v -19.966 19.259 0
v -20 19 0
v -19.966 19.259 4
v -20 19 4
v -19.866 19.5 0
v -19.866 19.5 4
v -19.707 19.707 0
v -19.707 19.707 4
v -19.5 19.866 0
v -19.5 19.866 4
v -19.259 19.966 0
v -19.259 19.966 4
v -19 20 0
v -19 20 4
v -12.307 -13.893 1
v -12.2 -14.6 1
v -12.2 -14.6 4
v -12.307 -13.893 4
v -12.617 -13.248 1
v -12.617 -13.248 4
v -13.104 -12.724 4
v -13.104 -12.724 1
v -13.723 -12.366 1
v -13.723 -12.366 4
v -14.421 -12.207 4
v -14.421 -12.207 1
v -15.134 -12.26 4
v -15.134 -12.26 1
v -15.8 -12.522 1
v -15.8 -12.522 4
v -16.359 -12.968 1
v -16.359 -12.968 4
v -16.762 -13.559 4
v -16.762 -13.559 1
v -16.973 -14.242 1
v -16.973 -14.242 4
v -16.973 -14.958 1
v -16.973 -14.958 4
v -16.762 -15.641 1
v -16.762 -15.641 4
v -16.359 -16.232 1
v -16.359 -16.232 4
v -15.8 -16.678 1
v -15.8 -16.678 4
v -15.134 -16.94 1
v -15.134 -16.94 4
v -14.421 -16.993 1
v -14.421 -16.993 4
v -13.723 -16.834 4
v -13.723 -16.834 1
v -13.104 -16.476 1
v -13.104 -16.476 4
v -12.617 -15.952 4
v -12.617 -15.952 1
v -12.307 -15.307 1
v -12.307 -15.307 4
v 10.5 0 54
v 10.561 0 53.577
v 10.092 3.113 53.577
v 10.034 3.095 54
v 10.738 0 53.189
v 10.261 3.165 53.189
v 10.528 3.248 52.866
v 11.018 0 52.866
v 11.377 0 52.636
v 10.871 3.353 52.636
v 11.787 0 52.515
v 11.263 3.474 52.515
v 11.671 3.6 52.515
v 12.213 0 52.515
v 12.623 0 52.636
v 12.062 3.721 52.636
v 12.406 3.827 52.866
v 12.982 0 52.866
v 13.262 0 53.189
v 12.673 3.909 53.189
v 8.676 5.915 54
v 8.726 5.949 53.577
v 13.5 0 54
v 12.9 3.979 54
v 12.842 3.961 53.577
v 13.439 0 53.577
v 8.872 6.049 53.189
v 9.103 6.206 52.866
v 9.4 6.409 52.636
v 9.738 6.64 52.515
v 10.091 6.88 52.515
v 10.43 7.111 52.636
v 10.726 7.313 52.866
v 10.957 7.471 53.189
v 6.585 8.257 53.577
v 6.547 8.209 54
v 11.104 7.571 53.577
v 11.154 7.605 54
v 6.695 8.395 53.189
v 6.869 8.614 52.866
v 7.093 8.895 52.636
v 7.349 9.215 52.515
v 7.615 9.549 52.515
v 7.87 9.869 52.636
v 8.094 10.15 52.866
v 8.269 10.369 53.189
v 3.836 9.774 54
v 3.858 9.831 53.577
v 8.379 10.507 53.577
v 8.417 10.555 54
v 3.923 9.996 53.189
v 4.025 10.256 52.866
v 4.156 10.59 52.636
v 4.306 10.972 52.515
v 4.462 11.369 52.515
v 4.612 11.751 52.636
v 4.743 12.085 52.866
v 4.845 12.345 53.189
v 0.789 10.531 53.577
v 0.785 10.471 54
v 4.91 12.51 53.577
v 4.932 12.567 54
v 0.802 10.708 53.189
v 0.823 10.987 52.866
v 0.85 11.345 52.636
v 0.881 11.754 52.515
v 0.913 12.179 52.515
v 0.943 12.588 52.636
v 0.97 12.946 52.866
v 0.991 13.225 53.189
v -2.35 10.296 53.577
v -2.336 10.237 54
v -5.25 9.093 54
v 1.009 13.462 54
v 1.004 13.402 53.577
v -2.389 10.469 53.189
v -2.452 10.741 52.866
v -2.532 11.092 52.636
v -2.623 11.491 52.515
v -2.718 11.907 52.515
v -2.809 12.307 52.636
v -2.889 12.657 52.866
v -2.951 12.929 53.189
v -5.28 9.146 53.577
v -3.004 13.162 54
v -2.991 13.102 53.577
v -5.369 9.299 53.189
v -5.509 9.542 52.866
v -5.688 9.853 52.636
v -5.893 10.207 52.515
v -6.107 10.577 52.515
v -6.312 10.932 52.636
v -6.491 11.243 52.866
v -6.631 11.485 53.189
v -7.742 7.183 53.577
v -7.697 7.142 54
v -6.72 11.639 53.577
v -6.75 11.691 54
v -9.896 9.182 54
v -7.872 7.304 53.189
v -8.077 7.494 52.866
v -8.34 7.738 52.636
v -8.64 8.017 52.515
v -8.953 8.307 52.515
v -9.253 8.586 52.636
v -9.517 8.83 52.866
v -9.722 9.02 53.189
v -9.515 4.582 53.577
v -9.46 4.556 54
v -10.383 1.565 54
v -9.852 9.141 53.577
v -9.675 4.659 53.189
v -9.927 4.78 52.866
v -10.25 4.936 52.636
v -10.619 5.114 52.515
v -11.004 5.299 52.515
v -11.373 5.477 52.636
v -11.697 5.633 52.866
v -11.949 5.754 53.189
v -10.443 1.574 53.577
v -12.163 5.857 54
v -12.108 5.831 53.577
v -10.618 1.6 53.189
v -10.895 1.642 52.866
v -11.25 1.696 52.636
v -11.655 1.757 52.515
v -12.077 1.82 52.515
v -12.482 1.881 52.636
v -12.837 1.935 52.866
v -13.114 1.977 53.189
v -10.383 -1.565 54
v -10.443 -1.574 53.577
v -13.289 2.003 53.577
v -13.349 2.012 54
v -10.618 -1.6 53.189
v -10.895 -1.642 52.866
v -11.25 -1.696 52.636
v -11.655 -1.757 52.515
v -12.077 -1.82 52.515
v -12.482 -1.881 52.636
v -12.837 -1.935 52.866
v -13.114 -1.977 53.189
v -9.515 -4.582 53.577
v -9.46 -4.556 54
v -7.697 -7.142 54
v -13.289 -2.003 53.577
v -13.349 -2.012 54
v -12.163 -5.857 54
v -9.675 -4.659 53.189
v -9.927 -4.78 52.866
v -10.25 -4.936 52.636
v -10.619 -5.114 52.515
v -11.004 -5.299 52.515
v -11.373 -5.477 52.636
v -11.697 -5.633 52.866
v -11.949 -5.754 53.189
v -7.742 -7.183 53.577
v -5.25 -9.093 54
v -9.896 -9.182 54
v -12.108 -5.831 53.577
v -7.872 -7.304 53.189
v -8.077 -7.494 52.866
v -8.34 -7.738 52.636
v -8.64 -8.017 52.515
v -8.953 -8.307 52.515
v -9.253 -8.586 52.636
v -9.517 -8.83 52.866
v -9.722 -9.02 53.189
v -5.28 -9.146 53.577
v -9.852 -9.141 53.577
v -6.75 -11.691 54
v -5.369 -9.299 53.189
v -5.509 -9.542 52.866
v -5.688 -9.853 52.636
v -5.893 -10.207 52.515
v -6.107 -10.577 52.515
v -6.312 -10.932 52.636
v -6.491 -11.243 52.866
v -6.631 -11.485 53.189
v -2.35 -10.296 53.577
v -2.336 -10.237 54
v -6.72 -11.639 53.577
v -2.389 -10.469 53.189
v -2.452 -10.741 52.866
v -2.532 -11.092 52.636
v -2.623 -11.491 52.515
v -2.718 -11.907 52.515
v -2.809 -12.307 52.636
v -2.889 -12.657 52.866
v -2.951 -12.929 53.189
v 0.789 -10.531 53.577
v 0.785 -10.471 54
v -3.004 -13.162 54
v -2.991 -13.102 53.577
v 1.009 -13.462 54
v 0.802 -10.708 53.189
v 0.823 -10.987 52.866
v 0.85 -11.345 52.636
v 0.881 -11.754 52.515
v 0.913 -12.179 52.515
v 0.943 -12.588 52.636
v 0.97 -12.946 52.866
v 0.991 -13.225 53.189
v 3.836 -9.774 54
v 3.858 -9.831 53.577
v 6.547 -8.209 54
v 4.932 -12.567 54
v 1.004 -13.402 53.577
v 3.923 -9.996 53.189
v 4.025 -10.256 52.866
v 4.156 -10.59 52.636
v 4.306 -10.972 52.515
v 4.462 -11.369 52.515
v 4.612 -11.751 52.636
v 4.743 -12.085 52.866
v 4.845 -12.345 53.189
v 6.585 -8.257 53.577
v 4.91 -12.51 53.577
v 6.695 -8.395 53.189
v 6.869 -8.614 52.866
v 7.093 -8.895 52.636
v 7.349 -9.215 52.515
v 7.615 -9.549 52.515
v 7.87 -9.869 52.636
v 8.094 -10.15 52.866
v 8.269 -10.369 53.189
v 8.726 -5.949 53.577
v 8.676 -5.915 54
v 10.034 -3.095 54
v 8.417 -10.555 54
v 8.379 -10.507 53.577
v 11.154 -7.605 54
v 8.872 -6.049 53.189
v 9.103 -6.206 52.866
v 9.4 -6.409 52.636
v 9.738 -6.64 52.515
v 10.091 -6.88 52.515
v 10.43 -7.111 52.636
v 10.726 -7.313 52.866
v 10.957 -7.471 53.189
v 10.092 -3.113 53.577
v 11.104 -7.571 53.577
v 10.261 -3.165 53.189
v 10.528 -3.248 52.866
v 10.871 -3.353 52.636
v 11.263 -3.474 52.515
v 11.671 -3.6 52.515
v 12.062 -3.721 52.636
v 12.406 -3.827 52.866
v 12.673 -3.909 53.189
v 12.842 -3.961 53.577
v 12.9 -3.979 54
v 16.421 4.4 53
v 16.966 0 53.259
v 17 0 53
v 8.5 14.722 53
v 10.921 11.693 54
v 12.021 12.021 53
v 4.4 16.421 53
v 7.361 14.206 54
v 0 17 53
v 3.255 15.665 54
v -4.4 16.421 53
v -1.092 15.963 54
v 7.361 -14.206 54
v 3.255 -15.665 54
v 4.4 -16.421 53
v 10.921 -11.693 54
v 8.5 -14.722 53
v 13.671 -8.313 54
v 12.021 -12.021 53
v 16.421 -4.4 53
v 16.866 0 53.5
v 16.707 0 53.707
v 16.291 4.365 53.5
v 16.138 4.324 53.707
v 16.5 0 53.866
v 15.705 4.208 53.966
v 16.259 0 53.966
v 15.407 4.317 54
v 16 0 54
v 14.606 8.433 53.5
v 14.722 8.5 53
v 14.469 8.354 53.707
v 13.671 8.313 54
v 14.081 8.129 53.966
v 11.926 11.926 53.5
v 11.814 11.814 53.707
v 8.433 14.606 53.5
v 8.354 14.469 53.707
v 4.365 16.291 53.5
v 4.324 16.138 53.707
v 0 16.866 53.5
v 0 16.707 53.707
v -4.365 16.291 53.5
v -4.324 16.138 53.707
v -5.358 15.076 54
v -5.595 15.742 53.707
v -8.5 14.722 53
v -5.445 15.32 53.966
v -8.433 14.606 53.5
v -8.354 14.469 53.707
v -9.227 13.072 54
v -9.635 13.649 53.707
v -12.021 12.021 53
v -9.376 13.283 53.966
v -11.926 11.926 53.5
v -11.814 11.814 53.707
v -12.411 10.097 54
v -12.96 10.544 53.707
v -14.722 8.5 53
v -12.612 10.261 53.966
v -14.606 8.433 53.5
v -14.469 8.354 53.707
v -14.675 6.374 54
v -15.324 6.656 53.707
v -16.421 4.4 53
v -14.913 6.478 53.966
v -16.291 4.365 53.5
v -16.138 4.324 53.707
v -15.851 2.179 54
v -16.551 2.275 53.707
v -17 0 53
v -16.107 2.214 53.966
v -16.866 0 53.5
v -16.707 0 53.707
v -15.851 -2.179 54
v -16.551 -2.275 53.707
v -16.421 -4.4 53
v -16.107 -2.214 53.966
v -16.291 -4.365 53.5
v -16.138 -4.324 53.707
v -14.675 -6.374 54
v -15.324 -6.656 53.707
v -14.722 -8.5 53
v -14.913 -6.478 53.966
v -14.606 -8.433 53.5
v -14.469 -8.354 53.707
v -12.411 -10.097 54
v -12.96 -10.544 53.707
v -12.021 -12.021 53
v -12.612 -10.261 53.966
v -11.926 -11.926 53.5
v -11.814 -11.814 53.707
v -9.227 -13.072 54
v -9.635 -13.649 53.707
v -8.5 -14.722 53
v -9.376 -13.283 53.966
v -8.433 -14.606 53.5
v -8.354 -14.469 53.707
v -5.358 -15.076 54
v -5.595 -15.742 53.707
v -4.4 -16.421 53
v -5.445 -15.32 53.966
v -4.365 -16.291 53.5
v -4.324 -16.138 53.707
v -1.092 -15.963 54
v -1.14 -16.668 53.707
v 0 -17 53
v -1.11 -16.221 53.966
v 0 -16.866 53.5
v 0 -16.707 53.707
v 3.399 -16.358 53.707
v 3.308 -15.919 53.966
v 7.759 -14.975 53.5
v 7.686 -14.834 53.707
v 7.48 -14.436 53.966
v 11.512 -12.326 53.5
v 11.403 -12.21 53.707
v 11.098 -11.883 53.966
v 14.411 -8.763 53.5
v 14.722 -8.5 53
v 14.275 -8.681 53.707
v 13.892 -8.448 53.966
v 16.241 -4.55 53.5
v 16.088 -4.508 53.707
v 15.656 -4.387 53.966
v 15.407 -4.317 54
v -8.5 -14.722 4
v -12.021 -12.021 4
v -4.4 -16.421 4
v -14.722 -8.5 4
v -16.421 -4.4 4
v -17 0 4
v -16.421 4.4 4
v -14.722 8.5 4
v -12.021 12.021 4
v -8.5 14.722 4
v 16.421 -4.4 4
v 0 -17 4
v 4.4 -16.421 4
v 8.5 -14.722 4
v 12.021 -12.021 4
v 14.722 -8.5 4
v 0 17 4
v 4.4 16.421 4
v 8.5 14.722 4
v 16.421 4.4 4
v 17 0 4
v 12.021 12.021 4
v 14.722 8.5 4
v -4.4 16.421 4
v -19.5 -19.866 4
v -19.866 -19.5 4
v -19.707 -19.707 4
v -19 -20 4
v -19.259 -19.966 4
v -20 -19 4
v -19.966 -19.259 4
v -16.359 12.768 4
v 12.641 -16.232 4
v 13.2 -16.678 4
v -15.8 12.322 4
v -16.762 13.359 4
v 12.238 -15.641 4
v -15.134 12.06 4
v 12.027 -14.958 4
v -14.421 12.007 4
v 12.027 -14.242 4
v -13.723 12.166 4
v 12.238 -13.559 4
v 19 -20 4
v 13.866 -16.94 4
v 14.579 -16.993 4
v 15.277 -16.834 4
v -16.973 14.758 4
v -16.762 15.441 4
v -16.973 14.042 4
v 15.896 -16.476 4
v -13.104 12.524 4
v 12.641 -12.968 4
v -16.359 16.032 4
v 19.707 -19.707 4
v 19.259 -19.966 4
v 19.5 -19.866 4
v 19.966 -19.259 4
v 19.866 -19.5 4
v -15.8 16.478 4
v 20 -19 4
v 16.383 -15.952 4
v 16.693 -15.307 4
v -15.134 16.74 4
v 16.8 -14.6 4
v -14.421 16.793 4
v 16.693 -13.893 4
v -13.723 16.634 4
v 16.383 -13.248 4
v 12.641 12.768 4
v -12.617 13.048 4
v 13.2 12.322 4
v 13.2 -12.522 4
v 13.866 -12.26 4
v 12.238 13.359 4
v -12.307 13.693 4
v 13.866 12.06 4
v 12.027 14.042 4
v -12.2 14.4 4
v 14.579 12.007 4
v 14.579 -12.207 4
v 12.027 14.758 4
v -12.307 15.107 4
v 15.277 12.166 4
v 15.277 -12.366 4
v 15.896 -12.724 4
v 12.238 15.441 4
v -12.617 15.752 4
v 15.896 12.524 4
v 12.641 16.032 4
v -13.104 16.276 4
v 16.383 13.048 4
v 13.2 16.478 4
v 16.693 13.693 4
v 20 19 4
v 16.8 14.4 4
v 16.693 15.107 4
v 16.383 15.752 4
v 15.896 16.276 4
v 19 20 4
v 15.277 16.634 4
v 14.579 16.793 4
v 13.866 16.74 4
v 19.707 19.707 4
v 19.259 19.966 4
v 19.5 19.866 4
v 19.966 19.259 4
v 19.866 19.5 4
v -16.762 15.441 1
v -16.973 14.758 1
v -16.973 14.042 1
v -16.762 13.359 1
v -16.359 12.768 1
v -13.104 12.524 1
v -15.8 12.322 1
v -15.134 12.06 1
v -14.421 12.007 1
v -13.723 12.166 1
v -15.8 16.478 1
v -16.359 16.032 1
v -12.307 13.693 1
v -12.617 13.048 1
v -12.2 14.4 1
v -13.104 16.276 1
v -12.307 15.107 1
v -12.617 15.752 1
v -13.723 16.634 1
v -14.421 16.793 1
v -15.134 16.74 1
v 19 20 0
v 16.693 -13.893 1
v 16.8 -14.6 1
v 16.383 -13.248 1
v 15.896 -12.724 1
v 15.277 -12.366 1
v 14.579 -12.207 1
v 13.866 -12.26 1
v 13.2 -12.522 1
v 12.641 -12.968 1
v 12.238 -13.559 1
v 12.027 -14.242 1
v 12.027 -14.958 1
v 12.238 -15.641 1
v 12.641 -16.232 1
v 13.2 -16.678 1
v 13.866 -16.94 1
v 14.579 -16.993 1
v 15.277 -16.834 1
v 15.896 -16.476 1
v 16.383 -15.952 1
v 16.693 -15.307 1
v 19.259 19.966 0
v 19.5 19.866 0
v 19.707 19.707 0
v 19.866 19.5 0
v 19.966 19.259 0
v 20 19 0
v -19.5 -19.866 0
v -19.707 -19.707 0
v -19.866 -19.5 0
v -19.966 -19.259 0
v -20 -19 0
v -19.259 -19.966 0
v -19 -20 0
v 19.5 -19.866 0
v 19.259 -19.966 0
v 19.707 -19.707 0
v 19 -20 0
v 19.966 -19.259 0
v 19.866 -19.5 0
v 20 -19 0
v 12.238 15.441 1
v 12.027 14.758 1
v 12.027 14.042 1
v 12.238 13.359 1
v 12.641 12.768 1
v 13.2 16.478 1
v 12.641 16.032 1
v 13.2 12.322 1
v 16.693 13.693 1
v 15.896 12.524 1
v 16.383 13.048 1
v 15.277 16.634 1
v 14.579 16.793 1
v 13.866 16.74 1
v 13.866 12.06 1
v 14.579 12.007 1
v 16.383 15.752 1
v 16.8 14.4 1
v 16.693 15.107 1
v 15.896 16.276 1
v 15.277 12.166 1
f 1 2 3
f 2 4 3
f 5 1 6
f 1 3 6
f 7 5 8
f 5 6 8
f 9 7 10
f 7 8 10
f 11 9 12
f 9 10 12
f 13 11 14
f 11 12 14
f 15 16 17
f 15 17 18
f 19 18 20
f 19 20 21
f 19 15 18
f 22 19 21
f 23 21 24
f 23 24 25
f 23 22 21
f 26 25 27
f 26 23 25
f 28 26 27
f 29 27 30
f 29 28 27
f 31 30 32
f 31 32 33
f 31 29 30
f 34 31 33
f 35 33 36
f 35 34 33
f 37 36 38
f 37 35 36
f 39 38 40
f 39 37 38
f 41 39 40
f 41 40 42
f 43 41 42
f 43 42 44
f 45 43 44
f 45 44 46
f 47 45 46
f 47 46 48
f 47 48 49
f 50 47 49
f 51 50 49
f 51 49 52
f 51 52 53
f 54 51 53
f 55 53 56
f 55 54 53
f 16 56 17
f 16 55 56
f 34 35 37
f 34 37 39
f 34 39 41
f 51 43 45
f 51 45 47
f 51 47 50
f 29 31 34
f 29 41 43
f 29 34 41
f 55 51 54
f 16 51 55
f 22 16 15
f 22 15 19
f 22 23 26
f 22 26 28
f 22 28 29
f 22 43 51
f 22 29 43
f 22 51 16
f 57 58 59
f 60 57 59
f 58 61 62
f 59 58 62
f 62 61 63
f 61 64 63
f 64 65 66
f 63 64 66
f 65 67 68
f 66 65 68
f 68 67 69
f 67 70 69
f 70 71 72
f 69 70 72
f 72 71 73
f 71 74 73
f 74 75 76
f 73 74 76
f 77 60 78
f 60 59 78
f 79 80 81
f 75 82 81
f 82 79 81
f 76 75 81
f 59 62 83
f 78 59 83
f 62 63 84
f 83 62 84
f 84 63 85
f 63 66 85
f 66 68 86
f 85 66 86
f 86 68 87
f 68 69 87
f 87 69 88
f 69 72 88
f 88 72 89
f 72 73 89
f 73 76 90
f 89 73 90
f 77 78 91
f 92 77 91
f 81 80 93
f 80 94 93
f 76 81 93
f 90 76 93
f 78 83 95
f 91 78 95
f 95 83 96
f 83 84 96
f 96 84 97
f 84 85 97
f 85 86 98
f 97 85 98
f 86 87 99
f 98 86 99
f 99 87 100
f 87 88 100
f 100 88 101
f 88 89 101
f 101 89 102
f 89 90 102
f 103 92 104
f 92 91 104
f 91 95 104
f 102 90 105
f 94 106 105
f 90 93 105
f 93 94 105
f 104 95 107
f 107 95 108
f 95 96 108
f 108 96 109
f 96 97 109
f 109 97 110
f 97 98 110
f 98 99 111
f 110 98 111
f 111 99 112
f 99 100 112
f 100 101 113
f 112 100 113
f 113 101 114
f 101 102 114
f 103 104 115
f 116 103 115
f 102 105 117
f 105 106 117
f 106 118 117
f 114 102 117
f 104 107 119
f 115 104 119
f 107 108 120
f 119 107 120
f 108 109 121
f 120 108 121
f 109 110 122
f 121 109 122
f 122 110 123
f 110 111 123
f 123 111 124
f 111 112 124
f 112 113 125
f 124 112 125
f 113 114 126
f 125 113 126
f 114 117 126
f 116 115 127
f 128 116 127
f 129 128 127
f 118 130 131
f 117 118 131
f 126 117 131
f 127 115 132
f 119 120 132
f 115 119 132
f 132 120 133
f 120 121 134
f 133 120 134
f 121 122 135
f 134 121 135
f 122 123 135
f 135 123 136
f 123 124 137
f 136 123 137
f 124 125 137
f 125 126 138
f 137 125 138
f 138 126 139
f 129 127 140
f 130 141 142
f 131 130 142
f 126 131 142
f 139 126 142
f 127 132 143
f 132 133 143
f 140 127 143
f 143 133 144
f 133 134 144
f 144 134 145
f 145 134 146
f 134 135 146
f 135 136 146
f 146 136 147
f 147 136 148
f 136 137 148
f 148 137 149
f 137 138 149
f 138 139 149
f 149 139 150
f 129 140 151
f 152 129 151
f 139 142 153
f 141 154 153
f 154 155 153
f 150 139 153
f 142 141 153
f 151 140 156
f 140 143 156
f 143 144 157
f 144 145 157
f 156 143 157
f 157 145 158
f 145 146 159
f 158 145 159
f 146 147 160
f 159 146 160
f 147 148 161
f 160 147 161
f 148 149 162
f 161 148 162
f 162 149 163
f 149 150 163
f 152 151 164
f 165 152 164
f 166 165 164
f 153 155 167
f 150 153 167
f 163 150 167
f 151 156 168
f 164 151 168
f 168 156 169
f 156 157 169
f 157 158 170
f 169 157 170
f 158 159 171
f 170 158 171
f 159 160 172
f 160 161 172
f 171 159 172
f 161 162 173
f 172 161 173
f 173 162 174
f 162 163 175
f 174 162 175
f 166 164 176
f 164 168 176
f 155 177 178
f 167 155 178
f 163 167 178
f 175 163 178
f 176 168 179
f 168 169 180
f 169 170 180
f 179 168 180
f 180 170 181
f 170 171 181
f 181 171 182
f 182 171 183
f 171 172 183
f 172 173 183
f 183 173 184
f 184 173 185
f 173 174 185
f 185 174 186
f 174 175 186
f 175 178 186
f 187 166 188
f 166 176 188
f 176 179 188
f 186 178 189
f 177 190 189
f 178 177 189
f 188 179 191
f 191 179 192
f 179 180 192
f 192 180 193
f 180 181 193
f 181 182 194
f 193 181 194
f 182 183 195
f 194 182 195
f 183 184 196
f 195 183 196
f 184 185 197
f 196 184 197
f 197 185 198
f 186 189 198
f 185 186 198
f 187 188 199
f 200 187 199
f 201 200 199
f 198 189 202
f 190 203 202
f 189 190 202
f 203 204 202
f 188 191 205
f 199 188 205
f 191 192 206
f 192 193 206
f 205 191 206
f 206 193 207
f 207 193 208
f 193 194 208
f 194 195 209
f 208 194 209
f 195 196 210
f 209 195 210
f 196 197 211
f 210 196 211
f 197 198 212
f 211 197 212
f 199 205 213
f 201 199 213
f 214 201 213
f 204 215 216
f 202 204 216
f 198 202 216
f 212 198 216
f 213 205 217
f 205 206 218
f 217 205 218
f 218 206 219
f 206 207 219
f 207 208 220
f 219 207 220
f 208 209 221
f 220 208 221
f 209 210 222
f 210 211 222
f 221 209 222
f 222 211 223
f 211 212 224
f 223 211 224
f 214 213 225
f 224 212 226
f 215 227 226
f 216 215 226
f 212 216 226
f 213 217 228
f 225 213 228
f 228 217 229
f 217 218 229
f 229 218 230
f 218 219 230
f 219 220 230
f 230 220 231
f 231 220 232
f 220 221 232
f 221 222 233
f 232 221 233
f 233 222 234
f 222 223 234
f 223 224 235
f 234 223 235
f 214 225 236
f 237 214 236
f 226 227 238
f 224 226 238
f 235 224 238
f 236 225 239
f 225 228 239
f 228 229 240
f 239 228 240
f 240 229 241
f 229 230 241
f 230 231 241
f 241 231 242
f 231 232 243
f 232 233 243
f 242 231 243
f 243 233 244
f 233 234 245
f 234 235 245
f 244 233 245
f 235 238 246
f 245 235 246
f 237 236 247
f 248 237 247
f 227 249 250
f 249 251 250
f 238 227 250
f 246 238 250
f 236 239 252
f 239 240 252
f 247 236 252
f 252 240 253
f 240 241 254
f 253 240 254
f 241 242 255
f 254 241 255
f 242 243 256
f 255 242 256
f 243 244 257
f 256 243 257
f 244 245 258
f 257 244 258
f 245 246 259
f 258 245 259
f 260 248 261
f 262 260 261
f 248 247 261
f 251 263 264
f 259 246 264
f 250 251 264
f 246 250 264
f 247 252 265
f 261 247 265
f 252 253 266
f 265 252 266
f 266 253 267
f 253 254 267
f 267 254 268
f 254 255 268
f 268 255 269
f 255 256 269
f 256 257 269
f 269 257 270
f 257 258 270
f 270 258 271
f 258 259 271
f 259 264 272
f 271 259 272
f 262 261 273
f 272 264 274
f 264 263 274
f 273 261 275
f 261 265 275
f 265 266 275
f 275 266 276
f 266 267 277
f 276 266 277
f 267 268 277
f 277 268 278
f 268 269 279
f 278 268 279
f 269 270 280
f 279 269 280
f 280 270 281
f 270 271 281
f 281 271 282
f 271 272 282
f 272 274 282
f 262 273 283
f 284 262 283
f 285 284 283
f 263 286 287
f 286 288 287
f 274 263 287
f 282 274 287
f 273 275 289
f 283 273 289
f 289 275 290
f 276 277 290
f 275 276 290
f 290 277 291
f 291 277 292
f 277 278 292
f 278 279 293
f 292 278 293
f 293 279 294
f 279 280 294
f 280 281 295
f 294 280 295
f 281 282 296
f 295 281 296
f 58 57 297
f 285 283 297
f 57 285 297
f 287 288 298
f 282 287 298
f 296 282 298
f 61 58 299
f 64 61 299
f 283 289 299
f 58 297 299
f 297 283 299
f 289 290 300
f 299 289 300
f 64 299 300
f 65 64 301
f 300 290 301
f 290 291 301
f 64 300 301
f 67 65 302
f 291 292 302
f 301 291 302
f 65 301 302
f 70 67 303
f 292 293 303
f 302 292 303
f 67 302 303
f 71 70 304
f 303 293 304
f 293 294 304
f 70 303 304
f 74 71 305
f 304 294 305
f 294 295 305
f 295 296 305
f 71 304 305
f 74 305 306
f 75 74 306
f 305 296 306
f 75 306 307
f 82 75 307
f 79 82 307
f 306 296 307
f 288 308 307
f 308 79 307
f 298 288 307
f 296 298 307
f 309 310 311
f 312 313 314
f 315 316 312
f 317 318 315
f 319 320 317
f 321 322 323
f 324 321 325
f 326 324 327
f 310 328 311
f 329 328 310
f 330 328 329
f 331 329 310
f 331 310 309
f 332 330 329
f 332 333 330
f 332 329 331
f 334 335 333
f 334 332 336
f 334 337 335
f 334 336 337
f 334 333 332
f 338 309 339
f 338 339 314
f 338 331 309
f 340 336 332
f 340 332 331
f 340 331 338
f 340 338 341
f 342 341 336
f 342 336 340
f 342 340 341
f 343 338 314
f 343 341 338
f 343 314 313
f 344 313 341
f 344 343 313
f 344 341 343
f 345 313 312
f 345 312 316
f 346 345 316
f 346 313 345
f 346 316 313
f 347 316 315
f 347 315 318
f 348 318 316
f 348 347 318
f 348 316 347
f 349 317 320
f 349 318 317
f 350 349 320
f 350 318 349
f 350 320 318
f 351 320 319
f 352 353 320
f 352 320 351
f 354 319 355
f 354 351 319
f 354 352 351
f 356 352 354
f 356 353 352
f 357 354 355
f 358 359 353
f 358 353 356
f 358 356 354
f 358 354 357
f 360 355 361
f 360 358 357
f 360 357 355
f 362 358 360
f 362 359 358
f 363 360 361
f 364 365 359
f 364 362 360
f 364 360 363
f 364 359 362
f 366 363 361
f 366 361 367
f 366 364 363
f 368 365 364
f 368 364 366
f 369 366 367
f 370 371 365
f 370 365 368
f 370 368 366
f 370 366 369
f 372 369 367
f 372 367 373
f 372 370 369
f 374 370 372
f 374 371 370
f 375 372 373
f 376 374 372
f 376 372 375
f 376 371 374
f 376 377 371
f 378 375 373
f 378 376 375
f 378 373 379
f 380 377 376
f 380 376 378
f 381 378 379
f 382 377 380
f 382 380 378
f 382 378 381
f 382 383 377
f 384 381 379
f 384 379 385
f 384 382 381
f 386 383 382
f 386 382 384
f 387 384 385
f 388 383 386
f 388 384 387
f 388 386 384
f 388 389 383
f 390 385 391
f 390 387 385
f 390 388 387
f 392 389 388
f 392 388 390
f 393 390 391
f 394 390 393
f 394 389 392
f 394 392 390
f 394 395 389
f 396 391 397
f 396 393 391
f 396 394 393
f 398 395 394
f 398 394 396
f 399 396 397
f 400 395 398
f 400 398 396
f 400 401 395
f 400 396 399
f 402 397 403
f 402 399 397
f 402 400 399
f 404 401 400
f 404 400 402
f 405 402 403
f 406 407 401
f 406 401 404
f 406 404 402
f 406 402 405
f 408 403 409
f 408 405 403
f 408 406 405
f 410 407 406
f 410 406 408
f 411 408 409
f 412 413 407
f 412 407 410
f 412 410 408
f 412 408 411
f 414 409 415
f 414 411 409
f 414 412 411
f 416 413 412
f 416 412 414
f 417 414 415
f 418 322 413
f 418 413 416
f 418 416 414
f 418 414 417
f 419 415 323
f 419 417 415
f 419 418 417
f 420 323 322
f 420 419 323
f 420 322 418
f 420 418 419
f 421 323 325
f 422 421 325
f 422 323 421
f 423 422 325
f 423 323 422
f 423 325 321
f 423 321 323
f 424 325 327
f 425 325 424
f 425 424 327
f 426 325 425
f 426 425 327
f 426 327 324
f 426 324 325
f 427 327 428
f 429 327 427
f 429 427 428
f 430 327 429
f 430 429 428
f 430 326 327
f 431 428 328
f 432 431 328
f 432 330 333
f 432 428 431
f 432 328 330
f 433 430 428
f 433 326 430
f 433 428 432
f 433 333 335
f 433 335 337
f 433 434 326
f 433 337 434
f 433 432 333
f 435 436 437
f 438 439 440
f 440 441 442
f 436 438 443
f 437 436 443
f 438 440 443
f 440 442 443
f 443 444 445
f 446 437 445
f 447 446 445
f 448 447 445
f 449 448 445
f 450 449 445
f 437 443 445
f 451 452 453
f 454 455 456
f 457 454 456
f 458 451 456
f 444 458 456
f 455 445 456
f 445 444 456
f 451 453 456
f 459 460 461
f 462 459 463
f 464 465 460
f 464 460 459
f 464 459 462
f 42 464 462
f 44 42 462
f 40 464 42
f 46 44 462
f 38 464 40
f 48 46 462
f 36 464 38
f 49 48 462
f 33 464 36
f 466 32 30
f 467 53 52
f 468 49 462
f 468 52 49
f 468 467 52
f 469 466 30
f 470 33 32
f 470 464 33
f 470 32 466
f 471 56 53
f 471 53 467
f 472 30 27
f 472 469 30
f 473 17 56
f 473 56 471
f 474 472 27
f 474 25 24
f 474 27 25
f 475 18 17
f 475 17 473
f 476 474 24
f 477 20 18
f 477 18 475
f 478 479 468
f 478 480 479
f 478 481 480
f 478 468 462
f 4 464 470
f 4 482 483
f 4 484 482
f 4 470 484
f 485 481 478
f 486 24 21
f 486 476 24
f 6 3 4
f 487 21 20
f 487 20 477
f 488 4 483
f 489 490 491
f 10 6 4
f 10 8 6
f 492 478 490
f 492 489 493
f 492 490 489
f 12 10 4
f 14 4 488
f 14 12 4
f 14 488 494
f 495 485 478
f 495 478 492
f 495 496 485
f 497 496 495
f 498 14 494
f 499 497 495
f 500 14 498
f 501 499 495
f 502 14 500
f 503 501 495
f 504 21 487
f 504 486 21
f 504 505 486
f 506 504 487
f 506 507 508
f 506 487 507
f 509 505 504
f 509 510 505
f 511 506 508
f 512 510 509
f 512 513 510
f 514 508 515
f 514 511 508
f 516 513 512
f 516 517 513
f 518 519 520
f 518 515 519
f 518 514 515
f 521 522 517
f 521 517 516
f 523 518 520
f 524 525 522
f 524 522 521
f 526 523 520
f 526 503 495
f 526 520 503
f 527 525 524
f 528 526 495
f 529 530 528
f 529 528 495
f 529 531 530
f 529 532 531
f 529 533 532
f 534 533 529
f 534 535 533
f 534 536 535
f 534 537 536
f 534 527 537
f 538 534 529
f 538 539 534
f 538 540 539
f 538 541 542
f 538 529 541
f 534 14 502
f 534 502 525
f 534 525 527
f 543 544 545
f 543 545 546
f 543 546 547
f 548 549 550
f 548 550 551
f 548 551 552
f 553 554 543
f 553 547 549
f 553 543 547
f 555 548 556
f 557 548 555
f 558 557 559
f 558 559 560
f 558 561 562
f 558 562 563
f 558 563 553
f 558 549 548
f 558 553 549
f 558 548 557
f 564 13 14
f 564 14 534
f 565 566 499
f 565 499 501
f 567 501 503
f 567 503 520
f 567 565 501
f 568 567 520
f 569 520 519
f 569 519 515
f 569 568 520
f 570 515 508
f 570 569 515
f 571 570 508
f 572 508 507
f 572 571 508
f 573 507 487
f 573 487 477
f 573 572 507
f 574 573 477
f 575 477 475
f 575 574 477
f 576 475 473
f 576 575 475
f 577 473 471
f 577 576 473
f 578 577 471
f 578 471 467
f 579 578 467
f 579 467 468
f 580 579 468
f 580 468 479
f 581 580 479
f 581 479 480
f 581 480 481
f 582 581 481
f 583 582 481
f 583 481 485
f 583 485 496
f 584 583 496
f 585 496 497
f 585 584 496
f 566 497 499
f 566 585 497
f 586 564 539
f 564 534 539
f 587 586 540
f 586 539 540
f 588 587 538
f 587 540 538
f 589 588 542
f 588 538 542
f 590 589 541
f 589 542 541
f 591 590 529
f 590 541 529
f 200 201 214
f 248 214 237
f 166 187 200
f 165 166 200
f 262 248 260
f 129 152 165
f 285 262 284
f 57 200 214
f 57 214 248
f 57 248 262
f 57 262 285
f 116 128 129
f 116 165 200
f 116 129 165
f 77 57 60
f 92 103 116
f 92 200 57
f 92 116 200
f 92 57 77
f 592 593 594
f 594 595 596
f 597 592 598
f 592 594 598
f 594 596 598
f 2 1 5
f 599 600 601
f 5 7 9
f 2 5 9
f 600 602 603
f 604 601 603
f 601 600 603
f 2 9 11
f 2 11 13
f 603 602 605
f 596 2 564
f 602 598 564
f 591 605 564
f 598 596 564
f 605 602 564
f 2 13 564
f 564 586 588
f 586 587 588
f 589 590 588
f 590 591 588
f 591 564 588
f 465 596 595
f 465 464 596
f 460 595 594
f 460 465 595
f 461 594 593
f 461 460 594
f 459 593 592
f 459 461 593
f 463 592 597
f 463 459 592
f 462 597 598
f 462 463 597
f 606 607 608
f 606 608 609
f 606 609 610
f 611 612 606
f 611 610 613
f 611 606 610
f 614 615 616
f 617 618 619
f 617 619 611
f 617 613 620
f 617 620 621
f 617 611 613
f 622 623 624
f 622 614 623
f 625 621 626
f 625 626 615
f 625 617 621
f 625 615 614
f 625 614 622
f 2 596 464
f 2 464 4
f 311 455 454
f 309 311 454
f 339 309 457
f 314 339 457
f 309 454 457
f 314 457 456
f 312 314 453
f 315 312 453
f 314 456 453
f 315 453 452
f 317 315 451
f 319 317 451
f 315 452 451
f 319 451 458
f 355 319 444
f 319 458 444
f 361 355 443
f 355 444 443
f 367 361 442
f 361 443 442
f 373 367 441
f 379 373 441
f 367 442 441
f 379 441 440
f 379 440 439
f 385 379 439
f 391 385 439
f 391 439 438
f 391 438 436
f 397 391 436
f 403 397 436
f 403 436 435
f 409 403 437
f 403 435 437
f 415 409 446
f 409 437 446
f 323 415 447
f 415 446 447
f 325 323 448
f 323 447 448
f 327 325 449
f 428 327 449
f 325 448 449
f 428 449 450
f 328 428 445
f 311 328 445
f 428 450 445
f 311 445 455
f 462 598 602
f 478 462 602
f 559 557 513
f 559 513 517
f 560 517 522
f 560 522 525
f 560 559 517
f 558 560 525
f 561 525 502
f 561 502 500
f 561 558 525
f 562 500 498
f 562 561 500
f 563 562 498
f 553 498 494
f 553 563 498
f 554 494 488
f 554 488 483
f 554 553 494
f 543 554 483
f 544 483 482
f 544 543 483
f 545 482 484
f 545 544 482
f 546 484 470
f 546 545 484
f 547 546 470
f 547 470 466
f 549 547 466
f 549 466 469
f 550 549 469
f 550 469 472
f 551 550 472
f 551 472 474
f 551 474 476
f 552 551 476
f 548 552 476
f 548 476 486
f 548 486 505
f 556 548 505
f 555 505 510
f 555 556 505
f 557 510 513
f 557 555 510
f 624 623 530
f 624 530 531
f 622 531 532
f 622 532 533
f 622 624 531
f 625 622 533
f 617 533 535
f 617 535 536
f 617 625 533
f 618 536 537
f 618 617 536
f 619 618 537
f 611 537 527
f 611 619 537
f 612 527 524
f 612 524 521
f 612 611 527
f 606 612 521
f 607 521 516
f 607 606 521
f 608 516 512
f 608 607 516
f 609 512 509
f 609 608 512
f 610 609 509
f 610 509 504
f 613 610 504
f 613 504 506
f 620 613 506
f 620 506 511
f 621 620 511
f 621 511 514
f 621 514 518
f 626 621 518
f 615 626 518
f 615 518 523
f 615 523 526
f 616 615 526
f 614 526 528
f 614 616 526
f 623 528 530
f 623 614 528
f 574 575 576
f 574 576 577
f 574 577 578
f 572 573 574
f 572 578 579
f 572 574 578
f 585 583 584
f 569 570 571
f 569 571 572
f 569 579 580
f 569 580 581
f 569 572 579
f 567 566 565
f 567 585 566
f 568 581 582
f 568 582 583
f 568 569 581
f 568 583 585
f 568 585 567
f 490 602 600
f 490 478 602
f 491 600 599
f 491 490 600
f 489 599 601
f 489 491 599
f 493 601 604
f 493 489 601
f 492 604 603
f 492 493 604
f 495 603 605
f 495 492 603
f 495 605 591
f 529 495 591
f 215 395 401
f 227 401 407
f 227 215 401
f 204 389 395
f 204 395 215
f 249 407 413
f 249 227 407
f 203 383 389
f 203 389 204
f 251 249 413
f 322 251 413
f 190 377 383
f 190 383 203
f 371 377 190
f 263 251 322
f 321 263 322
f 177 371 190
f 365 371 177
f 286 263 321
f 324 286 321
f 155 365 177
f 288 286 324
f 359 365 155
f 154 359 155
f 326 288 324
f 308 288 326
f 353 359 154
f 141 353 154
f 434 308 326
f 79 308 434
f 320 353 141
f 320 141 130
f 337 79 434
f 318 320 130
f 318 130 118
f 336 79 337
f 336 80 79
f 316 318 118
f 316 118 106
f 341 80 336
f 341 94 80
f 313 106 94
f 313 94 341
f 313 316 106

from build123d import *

# Parameters (mm, degrees)
TORUS_R           = 1.5
CYLINDER004_R     = 17
CYLINDER004_DEPTH = 50
FILLET_R          = 1
CYLINDER001_R     = 2.4
CYLINDER001_DEPTH = 3
CYLINDER002_R     = 2.4
CYLINDER002_DEPTH = 3
CYLINDER003_R     = 2.4
CYLINDER003_DEPTH = 3
CYLINDER_R        = 2.4
CYLINDER_DEPTH    = 3
BOX_W             = 40
BOX_H             = 40
BOX_DEPTH         = 4
FILLET001_R       = 1


with BuildPart() as torus:
    # Torus → Torus (revolve)
    with BuildSketch(Plane(origin=(0, 0, 54), x_dir=(1, 0, 0), z_dir=(0, -1, 0))):
        with Locations((12, 0)):
            Circle(TORUS_R)
    revolve(axis=Axis((0, 0, 54), (0, 0, 1)))


with BuildPart() as fillet_body:
    # Cylinder004 → Cylinder004 (new body)
    with BuildSketch(Plane.XY.offset(4)):
        Circle(CYLINDER004_R)
    extrude(amount=CYLINDER004_DEPTH)

    # Cut001: cut Torus
    add(torus.part, mode=Mode.SUBTRACT)

    # Fillet
    fillet_edges = [fillet_body.edges().sort_by_distance(p)[0] for p in [
        (-17, 0, 54),
    ]]
    fillet(fillet_edges, radius=FILLET_R)


with BuildPart() as cilindre001:
    # Cylinder001 → Cylinder001 (new body)
    with BuildSketch(Plane(origin=(34.4, 5.4, 1), x_dir=(1, 0, 0), z_dir=(0, 0, 1))):
        Circle(CYLINDER001_R)
    extrude(amount=CYLINDER001_DEPTH)


with BuildPart() as cilindre002:
    # Cylinder002 → Cylinder002 (new body)
    with BuildSketch(Plane(origin=(34.4, 34.4, 1), x_dir=(1, 0, 0), z_dir=(0, 0, 1))):
        Circle(CYLINDER002_R)
    extrude(amount=CYLINDER002_DEPTH)


with BuildPart() as cilindre003:
    # Cylinder003 → Cylinder003 (new body)
    with BuildSketch(Plane(origin=(5.4, 34.4, 1), x_dir=(1, 0, 0), z_dir=(0, 0, 1))):
        Circle(CYLINDER003_R)
    extrude(amount=CYLINDER003_DEPTH)


with BuildPart() as fusion:
    # Cylinder → Cylinder (new body)
    with BuildSketch(Plane(origin=(5.4, 5.4, 1), x_dir=(1, 0, 0), z_dir=(0, 0, 1))):
        Circle(CYLINDER_R)
    extrude(amount=CYLINDER_DEPTH)

    # Fusion: union Cilindre001, Cilindre002, Cilindre003
    add(cilindre001.part)
    add(cilindre002.part)
    add(cilindre003.part)


with BuildPart() as fillet001:
    # Box → Box (new body)
    with BuildSketch(Plane.XY):
        with Locations((20, 20)):
            Rectangle(BOX_W, BOX_H)
    extrude(amount=BOX_DEPTH)

    # Cut: cut Fusion
    add(fusion.part, mode=Mode.SUBTRACT)


with BuildPart() as fillet001_1:
    # Cut placement: moved
    add(fillet001.part.moved(Location((-20, -20, 0))))

    # Fillet001
    fillet001_edges = [fillet001_1.edges().sort_by_distance(p)[0] for p in [
        (-20, -20, 2),
        (-20, 20, 2),
        (20, -20, 2),
        (20, 20, 2),
    ]]
    fillet(fillet001_edges, radius=FILLET001_R)


solid = Compound([fillet_body.part, fillet001_1.part])
